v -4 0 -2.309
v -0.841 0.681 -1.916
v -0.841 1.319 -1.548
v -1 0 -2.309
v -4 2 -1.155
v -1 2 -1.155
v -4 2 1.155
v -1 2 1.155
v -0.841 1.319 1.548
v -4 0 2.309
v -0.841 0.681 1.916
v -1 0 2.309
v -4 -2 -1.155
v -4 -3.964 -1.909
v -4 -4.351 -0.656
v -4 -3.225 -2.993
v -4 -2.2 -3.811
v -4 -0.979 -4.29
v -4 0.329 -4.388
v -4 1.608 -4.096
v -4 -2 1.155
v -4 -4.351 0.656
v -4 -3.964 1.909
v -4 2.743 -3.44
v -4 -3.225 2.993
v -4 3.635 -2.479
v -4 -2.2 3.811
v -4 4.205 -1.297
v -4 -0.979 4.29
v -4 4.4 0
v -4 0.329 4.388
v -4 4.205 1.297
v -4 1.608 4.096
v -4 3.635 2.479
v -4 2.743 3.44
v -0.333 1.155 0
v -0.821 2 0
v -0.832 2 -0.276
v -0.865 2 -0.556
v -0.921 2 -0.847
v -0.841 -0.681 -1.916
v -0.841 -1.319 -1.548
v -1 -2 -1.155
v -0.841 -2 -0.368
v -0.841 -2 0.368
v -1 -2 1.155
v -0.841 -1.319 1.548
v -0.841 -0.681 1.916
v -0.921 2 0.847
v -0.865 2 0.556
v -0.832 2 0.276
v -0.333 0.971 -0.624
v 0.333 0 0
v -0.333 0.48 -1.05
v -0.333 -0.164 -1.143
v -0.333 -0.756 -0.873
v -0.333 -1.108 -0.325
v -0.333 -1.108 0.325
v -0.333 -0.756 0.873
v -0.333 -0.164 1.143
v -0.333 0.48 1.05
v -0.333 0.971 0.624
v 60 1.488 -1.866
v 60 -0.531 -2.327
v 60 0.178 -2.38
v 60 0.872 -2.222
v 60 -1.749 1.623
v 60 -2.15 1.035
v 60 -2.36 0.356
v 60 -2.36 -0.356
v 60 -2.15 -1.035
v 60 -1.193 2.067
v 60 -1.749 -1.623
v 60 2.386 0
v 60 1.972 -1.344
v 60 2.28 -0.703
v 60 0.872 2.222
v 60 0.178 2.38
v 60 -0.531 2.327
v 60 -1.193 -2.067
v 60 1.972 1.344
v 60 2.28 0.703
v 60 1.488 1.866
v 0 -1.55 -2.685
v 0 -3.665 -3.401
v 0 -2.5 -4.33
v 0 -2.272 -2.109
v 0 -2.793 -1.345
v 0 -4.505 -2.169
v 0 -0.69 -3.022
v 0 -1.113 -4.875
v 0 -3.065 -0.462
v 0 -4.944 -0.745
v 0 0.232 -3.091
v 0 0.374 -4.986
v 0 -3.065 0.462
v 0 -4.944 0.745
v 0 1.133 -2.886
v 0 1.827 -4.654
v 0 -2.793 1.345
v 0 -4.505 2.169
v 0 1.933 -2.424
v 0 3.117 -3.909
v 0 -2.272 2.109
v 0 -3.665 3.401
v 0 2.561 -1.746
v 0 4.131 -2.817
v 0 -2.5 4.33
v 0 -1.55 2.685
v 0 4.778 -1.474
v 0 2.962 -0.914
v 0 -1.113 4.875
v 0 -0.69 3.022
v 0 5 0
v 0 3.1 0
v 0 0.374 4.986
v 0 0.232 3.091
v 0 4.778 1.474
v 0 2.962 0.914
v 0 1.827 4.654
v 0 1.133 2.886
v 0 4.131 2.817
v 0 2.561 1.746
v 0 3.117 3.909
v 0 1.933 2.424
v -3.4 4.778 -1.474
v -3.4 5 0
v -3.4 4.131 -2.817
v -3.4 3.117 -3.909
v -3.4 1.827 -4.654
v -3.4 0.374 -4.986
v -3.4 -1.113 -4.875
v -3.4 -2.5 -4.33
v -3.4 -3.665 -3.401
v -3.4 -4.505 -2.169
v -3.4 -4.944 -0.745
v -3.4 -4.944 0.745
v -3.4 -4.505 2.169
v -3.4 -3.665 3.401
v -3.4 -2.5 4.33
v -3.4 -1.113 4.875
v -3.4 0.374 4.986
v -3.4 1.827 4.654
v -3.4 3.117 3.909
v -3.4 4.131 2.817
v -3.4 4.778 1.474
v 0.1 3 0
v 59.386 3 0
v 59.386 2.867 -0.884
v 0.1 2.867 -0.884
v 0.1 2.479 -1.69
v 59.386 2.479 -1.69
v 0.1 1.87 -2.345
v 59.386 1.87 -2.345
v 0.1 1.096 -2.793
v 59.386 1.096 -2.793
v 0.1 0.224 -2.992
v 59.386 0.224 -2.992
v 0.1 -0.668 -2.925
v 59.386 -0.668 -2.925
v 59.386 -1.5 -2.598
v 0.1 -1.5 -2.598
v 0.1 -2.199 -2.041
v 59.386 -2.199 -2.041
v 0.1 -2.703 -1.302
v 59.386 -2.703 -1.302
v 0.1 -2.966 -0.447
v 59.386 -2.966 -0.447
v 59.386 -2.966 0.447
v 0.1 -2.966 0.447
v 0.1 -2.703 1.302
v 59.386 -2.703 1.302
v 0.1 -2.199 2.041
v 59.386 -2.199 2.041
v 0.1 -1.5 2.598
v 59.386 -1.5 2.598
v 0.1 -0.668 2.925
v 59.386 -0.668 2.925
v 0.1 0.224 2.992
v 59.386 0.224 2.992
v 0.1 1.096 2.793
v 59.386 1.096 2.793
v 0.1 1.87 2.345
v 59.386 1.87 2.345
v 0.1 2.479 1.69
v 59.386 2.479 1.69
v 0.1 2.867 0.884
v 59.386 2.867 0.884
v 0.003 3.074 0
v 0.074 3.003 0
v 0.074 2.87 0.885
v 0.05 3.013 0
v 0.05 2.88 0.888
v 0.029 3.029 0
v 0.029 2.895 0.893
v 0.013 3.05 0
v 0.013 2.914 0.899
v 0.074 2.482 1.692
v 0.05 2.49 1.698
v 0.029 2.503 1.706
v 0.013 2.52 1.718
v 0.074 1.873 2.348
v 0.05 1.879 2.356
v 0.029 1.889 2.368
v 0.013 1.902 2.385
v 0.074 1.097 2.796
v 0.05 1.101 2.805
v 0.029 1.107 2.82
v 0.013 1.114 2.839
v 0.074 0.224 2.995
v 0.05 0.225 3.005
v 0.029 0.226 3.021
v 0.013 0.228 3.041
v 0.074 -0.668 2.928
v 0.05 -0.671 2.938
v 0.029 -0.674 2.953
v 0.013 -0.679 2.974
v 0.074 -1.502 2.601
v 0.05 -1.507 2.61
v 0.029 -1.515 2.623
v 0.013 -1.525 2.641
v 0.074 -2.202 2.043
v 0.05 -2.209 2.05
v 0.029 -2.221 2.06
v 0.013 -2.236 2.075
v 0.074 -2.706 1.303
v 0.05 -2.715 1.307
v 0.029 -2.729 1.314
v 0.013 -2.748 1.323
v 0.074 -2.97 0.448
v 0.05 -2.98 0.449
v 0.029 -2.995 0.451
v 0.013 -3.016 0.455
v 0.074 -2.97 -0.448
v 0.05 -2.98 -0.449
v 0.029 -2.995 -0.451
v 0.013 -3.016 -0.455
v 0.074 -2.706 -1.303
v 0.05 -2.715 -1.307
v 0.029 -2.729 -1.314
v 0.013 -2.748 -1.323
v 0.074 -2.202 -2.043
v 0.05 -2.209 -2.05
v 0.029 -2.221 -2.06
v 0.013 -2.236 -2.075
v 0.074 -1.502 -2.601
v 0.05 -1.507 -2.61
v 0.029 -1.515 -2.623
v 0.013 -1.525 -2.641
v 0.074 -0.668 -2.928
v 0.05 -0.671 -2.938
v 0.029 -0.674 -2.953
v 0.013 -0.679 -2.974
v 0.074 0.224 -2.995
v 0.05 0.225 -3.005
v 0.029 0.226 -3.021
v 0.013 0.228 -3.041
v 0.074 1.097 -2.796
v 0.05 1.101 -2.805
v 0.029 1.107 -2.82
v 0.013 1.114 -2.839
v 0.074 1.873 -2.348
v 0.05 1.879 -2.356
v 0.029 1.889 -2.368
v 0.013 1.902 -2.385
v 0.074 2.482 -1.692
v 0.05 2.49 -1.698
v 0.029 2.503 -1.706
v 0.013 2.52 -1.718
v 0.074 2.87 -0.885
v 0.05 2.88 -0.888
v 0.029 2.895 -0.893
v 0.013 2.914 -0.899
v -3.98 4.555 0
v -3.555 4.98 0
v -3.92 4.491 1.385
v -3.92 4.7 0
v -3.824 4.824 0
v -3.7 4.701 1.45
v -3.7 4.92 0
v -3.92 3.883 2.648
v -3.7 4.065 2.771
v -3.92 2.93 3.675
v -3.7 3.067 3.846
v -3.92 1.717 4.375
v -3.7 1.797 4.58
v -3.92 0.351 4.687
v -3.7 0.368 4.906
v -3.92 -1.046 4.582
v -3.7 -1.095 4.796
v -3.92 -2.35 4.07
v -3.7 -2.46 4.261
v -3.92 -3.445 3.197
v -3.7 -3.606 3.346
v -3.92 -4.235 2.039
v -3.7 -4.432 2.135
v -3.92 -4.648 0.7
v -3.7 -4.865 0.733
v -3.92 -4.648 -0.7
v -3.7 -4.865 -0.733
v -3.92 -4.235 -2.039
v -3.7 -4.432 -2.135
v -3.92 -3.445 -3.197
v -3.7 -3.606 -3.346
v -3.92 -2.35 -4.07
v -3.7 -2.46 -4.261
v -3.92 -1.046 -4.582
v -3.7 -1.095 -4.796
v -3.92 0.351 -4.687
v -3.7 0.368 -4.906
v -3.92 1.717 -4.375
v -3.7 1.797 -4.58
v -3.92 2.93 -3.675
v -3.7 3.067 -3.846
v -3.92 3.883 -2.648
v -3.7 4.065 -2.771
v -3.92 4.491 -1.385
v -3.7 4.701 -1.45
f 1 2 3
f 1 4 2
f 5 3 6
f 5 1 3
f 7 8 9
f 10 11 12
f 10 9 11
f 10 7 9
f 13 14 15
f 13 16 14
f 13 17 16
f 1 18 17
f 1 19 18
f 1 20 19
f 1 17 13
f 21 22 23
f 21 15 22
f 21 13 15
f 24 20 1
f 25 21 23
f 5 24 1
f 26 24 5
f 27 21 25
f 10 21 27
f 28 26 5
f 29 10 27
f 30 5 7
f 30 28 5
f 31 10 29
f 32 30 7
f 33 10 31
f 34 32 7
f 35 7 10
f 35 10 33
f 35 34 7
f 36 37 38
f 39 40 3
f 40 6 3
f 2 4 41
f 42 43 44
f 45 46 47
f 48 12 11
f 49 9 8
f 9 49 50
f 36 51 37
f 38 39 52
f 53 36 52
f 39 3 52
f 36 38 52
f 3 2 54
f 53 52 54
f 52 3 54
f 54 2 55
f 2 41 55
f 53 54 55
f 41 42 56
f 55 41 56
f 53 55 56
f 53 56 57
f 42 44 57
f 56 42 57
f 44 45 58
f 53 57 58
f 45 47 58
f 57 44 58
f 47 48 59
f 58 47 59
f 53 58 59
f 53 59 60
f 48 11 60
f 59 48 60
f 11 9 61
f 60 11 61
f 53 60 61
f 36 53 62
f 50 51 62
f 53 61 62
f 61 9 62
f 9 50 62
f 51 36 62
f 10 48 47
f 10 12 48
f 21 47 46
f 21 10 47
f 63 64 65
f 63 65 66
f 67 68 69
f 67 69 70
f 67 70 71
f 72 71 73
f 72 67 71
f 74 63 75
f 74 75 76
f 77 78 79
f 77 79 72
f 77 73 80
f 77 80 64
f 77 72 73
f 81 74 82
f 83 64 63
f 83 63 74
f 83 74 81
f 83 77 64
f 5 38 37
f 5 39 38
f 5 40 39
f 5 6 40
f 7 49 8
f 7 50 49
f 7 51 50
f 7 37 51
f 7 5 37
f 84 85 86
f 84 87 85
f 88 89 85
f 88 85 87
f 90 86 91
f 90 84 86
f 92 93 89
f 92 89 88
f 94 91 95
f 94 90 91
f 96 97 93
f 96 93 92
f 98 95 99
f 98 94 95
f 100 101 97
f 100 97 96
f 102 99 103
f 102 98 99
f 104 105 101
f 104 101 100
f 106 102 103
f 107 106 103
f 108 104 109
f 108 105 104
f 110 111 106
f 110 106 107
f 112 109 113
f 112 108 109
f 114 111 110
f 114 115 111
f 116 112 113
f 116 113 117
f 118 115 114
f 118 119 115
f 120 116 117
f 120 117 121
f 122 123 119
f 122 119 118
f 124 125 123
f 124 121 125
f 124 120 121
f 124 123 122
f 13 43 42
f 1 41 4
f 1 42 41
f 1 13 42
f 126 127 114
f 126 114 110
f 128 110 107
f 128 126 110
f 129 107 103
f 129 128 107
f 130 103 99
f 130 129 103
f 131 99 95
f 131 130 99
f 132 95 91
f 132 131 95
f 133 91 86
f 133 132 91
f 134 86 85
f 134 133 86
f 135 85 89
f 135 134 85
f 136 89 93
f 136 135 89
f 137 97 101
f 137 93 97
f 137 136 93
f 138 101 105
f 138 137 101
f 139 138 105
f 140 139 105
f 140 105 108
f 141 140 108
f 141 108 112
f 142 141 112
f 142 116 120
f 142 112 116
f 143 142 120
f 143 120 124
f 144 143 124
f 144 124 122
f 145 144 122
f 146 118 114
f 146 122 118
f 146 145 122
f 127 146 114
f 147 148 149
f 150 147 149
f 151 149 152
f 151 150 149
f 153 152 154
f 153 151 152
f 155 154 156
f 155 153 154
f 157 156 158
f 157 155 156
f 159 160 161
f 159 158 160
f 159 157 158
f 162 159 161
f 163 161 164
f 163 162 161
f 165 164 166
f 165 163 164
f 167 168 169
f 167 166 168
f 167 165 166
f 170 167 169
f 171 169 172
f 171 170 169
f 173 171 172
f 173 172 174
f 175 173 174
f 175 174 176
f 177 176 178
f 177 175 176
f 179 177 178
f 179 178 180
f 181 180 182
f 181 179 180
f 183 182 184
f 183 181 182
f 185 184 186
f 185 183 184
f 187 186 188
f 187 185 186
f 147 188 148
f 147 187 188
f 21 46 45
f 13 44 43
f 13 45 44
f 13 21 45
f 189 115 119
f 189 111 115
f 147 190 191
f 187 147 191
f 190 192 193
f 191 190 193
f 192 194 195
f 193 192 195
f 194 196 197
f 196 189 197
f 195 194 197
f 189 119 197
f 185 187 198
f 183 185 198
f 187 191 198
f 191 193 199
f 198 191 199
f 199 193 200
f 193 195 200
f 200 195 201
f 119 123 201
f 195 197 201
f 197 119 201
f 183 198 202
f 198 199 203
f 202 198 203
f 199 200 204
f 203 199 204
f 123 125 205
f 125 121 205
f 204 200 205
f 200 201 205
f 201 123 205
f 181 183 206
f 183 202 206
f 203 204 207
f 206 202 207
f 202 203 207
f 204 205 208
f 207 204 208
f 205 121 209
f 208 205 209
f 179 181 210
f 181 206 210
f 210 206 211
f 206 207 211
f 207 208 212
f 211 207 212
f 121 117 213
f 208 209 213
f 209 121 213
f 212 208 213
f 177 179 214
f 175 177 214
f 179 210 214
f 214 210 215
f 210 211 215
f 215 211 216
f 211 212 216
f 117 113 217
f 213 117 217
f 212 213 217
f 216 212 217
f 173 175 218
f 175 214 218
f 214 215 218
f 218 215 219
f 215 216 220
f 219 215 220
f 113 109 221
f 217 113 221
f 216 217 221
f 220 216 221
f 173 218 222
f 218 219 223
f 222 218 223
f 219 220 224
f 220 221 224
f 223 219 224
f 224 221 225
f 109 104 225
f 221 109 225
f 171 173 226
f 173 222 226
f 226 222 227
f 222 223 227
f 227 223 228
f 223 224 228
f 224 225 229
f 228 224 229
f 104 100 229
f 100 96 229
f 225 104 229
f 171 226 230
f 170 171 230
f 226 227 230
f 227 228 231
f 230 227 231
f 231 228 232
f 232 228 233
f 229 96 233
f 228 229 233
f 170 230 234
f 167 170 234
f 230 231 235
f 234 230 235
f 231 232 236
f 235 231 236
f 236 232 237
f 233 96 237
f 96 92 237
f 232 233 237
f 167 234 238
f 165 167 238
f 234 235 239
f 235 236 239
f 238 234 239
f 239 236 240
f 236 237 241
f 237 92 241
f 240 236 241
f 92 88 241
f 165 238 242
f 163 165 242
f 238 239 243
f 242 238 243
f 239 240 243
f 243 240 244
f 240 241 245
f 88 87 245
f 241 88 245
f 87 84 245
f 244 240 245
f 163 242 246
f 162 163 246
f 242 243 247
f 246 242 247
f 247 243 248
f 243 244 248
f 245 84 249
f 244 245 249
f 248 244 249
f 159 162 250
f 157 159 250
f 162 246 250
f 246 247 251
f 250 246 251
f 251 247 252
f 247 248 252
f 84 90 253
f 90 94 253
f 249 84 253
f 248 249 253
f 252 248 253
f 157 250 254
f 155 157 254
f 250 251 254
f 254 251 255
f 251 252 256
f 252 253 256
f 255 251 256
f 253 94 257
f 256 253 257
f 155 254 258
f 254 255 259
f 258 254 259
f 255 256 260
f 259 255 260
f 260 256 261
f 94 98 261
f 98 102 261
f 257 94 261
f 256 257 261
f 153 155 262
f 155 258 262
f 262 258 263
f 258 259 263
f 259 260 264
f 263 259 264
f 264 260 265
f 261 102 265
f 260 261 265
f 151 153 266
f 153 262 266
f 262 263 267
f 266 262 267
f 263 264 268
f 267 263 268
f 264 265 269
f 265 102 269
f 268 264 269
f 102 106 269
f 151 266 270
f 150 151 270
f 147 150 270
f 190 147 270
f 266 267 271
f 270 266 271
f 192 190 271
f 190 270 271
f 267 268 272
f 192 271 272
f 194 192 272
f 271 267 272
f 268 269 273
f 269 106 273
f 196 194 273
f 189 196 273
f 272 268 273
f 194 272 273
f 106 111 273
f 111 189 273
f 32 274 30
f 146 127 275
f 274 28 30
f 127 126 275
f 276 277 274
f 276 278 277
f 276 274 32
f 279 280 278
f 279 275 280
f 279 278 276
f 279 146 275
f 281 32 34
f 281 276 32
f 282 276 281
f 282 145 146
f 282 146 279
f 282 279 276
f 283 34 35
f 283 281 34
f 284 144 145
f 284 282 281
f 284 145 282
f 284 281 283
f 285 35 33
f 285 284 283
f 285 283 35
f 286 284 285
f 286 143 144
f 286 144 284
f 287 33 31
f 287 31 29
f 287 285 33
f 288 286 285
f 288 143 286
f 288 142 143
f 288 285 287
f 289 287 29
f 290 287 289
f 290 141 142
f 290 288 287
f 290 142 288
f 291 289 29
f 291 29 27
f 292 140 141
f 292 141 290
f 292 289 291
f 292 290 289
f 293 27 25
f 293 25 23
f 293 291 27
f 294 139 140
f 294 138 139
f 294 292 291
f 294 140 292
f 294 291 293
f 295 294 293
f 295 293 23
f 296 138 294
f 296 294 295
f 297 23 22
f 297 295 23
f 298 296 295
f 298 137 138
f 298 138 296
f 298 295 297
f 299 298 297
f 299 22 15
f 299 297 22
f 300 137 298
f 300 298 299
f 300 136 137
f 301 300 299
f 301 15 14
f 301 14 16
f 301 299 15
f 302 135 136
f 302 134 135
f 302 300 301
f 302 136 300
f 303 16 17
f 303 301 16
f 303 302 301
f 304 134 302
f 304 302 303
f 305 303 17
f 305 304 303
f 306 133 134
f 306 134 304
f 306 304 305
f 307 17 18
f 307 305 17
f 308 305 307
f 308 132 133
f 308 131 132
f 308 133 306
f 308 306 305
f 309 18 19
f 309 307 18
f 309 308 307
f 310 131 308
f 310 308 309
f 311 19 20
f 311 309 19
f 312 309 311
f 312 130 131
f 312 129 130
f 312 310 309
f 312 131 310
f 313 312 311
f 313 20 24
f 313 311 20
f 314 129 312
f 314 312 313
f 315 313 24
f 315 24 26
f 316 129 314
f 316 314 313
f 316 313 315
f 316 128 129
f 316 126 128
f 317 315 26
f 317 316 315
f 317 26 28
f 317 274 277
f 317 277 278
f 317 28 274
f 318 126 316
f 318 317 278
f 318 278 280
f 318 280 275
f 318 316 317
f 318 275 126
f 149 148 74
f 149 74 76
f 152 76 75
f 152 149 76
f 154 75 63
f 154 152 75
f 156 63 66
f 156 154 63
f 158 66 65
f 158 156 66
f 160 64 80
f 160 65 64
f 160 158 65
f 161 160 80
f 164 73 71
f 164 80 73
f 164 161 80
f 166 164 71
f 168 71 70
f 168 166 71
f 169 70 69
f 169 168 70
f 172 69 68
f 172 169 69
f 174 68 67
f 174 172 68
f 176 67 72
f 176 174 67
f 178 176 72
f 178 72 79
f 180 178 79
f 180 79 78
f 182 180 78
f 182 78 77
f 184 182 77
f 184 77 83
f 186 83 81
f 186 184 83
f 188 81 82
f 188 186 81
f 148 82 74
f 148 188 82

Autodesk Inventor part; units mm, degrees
ref_plane "YZ Plane" through (0, 0, 0) normal (1, 0, 0) x (0, 1, 0)
ref_plane "XZ Plane" through (0, 0, 0) normal (0, 1, 0) x (-1, 0, 0)
sketch "Sketch1" plane through (0, 0, 0) normal (0, 0, 1) x (1, 0, 0)
  line L0 (0.3333, 0) -> (60, 0)
  line L1 (60, 0) -> (60, 3)
  line L2 (60, 3) -> (42, 3)
  line L3 (42, 3) -> (41.3865, 3)
  line L4 (41.3865, 3) -> (0, 3)
  line L5 (0, 3) -> (0, 5)
  line L6 (0, 5) -> (-4, 5)
  line L7 (-4, 5) -> (-4, 2.3094)
  line L8 (-4, 2.3094) -> (-1, 2.3094)
  line L9 (-1, 2.3094) -> (0.3333, 0)
  line L10 (-15.8, 0) -> (66.8, 0) projected
  line L11 (0, -1) -> (0, 6) projected
  line L12 (42, 3) -> (0, 3) construction
  dimension "d1" = 18
  dimension "d2" = 0.6136
  dimension "d3" = 4
  dimension "d4" = 3
  dimension "d5" = 60
  dimension "d6" = 6
  dimension "d7" = 6
  dimension "d8" = 4.6188
  dimension "d9" = 10
  dimension "d26" = 60
revolve "Body" add sketch "Sketch1" angle 360 about axis through (0.3333, 0, 0) along (1, 0, 0) contours L9 L11 L4 L3 L2 L1 L0 | L9 L8 L7 L6 L5 L11
sketch "Sketch2" plane through (-4, 0, 0) normal (-1, 0, 0) x (0, 0, 1)
  circle A0 centre (0, 0) radius 2.3094 projected
  line L0 (0, -7) -> (0, 7) projected
  line L1 (-7, 0) -> (7, 0) projected
  line L2 (2.3094, 0) -> (1.1547, -2)
  line L3 (1.1547, -2) -> (-1.1547, -2)
  line L4 (-1.1547, -2) -> (-2.3094, 0)
  line L5 (-2.3094, 0) -> (-1.1547, 2)
  line L6 (-1.1547, 2) -> (1.1547, 2)
  line L7 (1.1547, 2) -> (2.3094, 0)
extrude "Slot" add sketch "Sketch2" against normal up to next contours L7 A0 | A0 L2 | L6 L0 A0 | A0 L0 L3 | L0 L6 A0 | A0 L3 L0 | L4 A0 | A0 L5
fillet "Fillet1" radius 0.6 1 edges at (-4, -5, 0)
thread "Thread" size "M6x1" class "6g" standard "ISO Metric profile" length 18
chamfer "Chamfer1" distance 0.6135 distance2 0.6135 1 edges at (60, -3, 0) measured on face at (60, 1.5134, 0.7943)
ref_plane "Work Plane1" through (29, 0, 0) normal (0, -1, 0) x (1, 0, 0)
fillet "Fillet2" radius 0.1 1 edges at (0, -3, 0)
equation "\"d1\" = GEL"
equation "\"d3\" = KOH"
equation "\"d4\" = INTI"
equation "\"d6\" = GD"
equation "\"d7\" = BDM"
equation "\"d8\" = 1.1547 * SW"
equation "\"d9\" = KOD"
equation "\"d26\" = NLG"
equation "\"d30\" = R"
equation "\"d17\" = RR"
equation "\"d13\" = GEL"
equation "\"d15\" = -0.5 * SPD + 0.5 * GD"
equation "\"d16\" = GUL"
equation "\"GD\" = NND"
equation "\"NLG\" = 60"
equation "\"GEL\" = 18"
equation "\"KOD\" = 10"
equation "\"KOH\" = 4"
equation "\"INTI\" = 3"
equation "\"GAL\" = 0.61345 * PTC"
equation "\"GUL\" = 0.61345 * PTC"
equation "\"BDM\" = NND"
equation "\"SW\" = 4"
equation "\"RR\" = 0.6"
equation "\"SPD\" = NND - 1.2269 * PTC"
equation "\"R\" = 0.1"
equation "\"TOA\" = 30deg"
equation "\"GD1\" = THREADDIA - 1.2269 * PTC"
equation "\"THREADDIA\" = 6"
equation "\"FAWI\" = 45deg"
equation "\"ANG\" = 120deg"
equation "\"PTC\" = 1"
equation "\"NND\" = 6"
equation "\"E0\" = 1.155 * SW"
properties part number "DIN 7984 - M6 x 40" material "Steel, Mild"
